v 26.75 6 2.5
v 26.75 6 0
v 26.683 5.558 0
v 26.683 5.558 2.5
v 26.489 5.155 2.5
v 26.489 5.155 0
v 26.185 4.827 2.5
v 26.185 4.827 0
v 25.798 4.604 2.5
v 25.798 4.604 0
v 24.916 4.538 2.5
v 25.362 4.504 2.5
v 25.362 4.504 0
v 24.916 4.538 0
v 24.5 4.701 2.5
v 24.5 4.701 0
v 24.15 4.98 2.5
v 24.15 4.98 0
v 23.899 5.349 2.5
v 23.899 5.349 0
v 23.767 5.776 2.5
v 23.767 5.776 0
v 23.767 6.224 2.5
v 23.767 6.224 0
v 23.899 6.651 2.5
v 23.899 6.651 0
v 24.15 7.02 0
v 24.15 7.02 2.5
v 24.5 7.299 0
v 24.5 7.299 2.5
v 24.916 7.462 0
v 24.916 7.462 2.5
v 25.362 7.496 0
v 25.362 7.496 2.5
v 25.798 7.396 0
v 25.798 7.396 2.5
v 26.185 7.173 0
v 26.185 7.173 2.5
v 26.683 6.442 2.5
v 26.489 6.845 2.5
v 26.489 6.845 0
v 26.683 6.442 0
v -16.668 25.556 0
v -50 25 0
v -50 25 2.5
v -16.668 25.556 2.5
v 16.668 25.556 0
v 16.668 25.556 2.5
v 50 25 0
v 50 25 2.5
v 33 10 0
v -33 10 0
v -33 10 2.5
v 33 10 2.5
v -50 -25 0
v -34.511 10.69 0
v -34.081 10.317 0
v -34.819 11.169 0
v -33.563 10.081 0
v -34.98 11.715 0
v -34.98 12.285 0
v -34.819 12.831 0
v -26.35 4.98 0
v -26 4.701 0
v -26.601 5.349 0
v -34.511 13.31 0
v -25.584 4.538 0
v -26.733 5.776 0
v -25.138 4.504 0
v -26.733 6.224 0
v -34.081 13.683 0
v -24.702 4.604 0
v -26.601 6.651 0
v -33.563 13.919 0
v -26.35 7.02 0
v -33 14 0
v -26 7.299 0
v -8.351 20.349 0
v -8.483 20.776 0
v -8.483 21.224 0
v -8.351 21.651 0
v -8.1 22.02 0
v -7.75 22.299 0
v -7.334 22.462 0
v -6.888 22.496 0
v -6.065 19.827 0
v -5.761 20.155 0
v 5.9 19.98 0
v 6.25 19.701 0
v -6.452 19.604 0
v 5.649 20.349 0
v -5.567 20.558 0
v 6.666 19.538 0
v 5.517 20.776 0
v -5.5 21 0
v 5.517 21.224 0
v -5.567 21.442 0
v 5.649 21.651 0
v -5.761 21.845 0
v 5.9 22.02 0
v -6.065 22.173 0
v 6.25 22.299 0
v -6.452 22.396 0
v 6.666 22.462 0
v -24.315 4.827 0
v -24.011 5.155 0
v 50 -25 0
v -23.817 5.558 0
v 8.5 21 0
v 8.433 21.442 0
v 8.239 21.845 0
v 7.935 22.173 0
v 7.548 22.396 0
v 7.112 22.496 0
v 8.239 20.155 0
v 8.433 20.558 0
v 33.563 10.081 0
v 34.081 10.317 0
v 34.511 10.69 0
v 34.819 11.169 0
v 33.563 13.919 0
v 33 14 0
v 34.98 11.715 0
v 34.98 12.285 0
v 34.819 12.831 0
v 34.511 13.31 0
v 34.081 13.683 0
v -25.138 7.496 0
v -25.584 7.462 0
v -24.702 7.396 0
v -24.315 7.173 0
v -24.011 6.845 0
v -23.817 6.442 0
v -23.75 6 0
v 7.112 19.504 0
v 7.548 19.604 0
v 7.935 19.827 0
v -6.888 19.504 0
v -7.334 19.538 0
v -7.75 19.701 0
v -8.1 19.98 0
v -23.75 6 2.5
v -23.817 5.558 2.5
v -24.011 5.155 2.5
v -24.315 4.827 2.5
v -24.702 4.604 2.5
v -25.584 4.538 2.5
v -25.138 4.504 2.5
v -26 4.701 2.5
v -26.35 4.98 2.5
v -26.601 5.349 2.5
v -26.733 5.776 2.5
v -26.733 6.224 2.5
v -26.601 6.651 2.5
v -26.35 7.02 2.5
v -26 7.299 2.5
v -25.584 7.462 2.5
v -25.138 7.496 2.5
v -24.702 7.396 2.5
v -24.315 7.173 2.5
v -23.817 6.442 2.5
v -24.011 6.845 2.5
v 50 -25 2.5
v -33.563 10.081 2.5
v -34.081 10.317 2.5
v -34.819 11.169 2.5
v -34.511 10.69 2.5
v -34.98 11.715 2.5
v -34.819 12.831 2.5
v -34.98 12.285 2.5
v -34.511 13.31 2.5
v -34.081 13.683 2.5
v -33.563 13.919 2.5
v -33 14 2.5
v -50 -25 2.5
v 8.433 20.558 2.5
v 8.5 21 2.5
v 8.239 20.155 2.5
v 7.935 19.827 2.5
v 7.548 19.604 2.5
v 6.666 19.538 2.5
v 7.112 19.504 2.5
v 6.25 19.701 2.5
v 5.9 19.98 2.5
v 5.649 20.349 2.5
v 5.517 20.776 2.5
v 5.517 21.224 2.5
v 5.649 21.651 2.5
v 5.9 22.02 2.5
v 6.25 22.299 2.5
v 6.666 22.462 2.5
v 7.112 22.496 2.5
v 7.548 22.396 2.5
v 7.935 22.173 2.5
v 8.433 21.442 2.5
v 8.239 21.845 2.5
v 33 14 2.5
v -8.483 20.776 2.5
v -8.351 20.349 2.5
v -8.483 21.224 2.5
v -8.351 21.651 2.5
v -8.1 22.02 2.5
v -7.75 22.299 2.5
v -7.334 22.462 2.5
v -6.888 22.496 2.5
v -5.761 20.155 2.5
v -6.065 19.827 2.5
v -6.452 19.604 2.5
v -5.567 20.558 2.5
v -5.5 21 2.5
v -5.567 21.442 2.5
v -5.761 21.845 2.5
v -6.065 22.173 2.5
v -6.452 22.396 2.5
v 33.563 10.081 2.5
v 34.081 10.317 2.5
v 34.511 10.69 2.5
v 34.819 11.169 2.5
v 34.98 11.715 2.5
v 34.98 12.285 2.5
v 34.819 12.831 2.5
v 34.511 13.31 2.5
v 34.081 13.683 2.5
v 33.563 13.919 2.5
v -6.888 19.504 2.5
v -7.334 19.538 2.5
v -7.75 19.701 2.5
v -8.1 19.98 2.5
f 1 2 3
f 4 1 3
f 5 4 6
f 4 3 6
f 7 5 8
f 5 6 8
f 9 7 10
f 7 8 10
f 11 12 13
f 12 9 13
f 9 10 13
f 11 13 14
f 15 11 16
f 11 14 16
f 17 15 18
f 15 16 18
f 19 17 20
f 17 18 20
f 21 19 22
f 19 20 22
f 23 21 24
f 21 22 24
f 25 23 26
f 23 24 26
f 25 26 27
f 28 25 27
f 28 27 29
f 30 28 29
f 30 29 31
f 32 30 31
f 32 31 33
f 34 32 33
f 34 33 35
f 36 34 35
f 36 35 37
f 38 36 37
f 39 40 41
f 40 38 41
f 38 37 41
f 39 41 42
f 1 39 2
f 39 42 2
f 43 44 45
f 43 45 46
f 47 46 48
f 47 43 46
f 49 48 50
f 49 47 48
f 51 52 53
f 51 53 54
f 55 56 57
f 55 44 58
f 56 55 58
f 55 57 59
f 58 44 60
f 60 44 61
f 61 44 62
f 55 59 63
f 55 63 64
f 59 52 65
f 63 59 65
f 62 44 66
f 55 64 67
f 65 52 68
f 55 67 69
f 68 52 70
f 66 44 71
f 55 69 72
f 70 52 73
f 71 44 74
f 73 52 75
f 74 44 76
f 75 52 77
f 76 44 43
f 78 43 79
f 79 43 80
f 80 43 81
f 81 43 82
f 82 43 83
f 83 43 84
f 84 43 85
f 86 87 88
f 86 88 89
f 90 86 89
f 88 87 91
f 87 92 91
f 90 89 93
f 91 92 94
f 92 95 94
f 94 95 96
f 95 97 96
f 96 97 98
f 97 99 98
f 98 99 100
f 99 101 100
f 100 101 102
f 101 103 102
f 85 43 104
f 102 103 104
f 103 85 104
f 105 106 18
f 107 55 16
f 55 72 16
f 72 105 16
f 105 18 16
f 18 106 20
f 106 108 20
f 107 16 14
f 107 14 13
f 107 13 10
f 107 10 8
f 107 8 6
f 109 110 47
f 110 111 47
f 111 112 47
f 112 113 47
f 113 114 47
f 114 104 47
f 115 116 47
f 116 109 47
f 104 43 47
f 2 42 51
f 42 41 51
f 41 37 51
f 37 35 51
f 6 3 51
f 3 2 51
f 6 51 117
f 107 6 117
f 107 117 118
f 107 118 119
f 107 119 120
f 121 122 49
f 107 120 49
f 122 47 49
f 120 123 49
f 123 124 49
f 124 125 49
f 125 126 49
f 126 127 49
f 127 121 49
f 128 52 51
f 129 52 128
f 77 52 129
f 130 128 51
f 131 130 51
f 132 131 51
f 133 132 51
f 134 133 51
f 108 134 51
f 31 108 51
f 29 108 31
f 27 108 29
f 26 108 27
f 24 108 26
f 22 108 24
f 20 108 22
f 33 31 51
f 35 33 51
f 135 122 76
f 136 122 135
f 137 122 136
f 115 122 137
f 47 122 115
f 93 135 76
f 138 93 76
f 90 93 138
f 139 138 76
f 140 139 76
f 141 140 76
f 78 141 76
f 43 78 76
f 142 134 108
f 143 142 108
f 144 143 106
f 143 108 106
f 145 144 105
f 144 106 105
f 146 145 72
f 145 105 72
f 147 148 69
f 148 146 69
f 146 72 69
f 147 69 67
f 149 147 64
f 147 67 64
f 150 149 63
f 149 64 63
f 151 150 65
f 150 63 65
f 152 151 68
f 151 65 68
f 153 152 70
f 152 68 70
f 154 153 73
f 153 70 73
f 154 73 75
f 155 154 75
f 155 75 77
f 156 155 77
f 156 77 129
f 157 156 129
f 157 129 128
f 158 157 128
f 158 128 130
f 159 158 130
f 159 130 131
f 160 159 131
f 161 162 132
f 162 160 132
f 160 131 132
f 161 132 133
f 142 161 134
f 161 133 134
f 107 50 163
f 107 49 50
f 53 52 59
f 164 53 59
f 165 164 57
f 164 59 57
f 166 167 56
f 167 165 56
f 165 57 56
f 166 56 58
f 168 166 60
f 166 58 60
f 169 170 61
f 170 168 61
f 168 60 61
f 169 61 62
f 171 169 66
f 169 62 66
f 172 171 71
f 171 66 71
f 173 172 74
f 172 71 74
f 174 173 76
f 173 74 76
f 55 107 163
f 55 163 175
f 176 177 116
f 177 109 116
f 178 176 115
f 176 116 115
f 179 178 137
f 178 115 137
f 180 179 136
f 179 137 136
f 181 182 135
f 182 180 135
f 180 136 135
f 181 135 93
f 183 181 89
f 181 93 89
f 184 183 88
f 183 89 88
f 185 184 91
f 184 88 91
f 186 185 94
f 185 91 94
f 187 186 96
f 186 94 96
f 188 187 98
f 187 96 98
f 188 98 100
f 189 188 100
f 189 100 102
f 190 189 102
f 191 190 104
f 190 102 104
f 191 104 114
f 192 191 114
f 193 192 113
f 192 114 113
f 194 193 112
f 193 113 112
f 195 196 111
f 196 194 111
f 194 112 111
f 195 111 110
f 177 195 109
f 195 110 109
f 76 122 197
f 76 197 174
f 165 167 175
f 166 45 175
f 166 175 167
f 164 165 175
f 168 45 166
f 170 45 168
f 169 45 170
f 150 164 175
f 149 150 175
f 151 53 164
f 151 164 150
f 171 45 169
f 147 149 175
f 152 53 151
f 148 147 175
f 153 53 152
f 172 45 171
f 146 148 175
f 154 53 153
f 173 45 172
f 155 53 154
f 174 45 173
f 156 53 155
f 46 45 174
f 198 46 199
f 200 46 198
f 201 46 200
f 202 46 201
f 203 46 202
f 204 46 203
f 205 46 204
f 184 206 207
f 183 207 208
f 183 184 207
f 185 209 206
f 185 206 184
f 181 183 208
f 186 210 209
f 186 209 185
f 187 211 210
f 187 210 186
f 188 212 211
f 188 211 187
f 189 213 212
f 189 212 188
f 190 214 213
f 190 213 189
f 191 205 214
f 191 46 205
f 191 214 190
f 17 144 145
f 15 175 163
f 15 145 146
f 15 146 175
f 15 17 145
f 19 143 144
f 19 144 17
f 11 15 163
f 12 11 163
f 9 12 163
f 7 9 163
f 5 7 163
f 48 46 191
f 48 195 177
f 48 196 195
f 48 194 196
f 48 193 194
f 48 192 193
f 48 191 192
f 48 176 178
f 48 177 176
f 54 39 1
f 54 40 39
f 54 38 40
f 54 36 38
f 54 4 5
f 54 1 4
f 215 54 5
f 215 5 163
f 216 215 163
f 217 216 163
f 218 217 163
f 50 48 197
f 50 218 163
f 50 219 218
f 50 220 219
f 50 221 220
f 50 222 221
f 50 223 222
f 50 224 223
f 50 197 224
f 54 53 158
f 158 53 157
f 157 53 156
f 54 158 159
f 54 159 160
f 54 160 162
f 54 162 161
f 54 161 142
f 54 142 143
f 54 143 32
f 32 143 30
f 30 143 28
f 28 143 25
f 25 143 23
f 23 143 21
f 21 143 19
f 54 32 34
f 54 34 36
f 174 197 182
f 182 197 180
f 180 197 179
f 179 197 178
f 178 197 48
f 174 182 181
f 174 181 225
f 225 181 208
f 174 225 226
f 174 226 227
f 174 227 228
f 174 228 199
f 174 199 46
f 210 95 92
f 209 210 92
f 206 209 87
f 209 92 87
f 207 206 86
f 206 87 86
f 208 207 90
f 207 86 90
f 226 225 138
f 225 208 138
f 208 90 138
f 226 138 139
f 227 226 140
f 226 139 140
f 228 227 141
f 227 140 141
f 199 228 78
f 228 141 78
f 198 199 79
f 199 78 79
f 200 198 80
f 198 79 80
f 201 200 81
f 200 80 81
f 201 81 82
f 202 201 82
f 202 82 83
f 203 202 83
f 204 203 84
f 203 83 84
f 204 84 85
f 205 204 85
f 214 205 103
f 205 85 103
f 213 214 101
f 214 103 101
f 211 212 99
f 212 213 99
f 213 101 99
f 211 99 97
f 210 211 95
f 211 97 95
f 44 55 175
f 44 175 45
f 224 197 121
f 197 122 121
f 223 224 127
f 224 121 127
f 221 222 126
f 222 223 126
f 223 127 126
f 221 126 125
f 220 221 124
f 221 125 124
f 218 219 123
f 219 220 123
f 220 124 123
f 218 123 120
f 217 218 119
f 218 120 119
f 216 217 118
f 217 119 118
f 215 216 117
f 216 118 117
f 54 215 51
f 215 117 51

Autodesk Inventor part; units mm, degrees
ref_plane "YZ Plane" through (0, 0, 0) normal (1, 0, 0) x (0, 1, 0)
ref_plane "XZ Plane" through (0, 0, 0) normal (0, 1, 0) x (-1, 0, 0)
ref_plane "XY Plane" through (0, 0, 0) normal (0, 0, 1) x (1, 0, 0)
sketch "Sketch1" plane through (0, 0, 0) normal (0, 0, 1) x (1, 0, 0)
  line L0 (-50, 25) -> (50, 25)
  line L1 (50, 25) -> (50, -25)
  line L2 (50, -25) -> (-50, -25)
  line L3 (-50, -25) -> (-50, 25)
  line L4 (-35, 12) -> (35, 12) construction
  line L5 (-33, 10) -> (33, 10)
  line L6 (33, 14) -> (-33, 14)
  arc A0 (-33, 14) -> (-33, 10) centre (-33, 12) ccw
  arc A1 (33, 10) -> (33, 14) centre (33, 12) ccw
  arc A2 (50, 25) -> (-50, 25) centre (0, -1974.3749) ccw
  circle A3 centre (-25.25, 6) radius 1.5
  circle A4 centre (25.25, 6) radius 1.5
  circle A5 centre (-7, 21) radius 1.5
  circle A6 centre (7, 21) radius 1.5
  line L7 (0, 134.945) -> (0, -92.5364) construction
  point P0 (0, 0)
  point P1 (50, 0)
  point P2 (0, -25)
  point P3 (0, 12)
  point P4 (35, 25.3188)
  point P5 (35, 6)
  dimension "d0" = 50
  dimension "d1" = 100
  dimension "d2" = 4
  dimension "d4" = 66
  dimension "d5" = 2000
  dimension "d6" = 50.5
  dimension "d7" = 3
  dimension "d8" = 14
  dimension "d9" = 9
  dimension "d10" = 4
  dimension "d11" = 6
  dimension "d14" = 13.3188
  dimension "d15" = 19.3188
extrude "Extrusion1" add sketch "Sketch1" along normal blind 2.5
properties part number "platform_part"
